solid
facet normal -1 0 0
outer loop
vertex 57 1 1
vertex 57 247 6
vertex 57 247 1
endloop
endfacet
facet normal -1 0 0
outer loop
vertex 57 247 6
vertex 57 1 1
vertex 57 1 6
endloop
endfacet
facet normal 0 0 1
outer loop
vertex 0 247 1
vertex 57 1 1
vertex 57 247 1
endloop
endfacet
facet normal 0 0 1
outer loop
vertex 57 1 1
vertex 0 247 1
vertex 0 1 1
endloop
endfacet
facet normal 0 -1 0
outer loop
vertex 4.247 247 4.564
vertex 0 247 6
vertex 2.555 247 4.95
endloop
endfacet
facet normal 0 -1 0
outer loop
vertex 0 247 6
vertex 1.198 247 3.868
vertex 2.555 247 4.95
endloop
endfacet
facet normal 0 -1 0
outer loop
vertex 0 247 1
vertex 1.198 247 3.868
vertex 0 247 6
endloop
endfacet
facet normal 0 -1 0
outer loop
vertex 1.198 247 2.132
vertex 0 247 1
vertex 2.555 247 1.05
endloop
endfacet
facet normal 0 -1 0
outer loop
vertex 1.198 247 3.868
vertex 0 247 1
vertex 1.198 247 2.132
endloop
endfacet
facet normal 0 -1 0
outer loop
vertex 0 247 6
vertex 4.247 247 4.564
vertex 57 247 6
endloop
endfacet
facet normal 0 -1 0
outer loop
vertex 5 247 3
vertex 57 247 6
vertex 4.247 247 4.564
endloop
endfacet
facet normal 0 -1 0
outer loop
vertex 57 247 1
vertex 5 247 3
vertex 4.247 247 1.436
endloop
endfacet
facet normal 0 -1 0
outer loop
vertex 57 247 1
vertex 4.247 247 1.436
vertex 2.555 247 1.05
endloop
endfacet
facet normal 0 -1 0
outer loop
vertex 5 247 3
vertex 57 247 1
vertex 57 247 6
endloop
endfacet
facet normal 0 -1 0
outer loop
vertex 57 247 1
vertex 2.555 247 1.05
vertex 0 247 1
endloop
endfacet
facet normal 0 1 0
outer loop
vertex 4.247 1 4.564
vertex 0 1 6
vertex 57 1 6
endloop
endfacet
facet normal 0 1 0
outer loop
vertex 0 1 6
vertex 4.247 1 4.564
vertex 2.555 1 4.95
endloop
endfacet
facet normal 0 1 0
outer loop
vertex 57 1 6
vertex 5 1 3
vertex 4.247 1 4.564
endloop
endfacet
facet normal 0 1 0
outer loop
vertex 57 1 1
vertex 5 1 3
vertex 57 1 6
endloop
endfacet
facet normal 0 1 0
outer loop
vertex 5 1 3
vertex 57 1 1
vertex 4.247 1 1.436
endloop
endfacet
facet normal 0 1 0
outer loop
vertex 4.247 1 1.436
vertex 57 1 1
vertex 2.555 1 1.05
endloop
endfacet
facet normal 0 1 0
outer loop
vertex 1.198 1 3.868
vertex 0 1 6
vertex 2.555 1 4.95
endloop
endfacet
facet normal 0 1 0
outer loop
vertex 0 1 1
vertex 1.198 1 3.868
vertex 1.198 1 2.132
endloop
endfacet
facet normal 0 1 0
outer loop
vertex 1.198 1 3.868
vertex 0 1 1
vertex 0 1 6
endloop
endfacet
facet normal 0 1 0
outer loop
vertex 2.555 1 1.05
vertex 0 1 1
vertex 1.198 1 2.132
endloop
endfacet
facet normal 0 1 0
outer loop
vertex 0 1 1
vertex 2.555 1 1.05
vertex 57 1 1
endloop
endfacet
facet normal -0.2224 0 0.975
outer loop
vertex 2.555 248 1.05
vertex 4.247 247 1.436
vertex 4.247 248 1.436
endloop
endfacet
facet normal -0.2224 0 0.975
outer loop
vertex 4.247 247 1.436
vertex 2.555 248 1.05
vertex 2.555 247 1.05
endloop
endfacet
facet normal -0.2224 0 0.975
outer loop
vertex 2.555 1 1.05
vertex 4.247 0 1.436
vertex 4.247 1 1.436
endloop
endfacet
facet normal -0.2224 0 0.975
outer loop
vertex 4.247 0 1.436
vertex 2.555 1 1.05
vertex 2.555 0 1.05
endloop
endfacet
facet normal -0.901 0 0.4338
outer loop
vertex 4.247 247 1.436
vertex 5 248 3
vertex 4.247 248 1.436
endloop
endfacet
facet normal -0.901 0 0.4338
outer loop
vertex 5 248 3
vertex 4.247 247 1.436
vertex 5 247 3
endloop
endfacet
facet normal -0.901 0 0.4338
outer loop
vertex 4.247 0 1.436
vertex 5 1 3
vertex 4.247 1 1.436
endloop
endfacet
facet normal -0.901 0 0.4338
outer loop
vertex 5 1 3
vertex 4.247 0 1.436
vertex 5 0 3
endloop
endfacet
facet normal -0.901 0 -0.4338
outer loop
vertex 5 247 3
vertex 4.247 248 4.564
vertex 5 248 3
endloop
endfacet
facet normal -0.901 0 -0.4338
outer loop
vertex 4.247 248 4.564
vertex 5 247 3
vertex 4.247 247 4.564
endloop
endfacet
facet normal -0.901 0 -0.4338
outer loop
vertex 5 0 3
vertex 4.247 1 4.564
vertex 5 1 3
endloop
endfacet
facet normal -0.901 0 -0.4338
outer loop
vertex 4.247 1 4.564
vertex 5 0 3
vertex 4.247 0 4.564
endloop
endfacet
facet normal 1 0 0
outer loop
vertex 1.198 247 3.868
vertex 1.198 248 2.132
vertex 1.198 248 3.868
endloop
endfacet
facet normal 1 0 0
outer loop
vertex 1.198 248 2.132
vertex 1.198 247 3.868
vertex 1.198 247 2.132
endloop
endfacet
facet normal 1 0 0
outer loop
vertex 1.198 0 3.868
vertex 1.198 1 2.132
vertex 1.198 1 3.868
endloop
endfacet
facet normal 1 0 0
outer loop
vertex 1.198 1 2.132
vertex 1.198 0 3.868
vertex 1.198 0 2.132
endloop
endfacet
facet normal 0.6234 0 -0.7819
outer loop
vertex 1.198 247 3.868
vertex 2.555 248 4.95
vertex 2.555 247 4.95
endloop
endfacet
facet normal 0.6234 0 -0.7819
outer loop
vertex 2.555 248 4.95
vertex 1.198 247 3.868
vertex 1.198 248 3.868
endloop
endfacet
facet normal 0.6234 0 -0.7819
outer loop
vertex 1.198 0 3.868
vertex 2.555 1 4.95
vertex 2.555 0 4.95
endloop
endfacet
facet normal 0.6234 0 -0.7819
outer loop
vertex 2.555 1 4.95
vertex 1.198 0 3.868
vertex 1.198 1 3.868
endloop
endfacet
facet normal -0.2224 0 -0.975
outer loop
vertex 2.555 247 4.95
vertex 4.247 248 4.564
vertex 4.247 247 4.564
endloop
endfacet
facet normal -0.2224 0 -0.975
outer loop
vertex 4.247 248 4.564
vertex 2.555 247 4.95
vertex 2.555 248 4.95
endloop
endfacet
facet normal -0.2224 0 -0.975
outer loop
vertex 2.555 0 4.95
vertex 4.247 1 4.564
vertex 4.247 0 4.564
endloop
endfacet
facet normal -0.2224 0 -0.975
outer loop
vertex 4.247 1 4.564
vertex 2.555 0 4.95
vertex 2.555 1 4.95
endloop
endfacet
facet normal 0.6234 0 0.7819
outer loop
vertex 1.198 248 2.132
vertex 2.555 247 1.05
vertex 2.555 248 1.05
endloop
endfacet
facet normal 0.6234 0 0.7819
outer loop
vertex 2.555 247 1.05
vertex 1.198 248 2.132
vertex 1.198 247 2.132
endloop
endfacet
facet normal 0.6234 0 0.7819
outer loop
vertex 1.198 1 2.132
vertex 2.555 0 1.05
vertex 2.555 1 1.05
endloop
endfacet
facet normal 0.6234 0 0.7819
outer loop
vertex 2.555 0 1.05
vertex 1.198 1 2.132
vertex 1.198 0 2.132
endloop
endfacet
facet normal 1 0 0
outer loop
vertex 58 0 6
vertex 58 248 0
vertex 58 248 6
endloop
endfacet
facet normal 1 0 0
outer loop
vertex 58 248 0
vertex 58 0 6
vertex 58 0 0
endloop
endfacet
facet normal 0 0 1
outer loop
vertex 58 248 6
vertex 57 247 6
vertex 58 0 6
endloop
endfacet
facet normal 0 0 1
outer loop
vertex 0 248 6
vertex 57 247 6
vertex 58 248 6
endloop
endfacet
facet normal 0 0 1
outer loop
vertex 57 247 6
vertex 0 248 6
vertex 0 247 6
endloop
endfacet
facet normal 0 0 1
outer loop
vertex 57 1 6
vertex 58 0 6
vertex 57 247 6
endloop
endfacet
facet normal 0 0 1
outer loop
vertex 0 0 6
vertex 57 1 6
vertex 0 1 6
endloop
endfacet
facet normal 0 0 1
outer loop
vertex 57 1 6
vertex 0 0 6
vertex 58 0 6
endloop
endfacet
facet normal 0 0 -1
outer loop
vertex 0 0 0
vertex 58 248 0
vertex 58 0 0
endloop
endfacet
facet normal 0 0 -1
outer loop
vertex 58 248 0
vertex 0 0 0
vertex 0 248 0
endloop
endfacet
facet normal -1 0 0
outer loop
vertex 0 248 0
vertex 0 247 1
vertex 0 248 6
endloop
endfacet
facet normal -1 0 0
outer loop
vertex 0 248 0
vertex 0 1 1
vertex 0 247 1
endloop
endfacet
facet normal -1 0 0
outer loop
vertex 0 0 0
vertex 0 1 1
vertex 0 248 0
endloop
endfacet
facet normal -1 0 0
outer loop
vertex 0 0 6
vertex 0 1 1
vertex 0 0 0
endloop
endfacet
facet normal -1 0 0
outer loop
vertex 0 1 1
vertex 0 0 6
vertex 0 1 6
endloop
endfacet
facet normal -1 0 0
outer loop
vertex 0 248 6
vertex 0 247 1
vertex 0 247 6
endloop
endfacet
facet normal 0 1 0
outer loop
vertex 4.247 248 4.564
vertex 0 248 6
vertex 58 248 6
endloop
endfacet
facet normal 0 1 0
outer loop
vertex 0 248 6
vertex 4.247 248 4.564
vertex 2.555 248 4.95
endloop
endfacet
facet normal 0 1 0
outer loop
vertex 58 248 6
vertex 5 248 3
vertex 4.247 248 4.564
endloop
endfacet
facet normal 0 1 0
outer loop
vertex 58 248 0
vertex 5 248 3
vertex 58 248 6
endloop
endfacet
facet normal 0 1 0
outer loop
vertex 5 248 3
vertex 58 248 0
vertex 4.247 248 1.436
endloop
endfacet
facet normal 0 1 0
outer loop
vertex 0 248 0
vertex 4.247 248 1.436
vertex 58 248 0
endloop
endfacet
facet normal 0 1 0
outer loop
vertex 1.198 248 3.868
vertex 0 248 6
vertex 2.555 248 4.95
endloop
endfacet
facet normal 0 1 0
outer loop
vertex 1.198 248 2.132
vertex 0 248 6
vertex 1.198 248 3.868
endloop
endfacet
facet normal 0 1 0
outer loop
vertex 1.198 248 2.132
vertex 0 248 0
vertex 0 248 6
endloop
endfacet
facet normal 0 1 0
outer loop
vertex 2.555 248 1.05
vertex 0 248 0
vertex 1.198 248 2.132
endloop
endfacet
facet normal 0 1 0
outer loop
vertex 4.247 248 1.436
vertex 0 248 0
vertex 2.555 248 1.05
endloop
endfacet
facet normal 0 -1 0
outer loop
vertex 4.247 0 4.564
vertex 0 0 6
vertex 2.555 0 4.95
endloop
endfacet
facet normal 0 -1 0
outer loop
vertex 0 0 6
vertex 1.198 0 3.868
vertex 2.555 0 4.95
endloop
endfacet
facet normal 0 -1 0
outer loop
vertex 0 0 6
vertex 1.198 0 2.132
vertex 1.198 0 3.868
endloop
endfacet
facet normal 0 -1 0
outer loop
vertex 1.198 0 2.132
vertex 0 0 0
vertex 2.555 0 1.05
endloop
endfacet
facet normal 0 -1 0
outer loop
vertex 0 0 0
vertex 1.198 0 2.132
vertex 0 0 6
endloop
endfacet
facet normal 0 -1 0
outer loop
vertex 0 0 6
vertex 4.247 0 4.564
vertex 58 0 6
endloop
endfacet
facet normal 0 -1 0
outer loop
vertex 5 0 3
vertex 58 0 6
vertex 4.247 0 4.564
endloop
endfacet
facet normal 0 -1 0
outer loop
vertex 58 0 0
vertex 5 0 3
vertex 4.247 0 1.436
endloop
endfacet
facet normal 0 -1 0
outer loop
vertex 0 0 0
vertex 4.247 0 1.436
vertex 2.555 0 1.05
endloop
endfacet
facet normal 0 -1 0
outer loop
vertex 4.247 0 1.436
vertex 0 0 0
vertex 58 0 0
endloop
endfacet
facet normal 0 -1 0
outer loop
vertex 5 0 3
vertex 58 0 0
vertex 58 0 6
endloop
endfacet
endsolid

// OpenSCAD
// [FL_INDEX: keywords="openscad, 3d_parametric, Customizable_Pill_Box_Lid, csg_solid" | COT="Parametric OpenSCAD design from 3DCodeverse"]
// Title: Customizable Pill Box Lid

//Applies To Each "Individual" Container
Length_For_Each_Compartment = 20; //[1:50]

//Applies To Each "Individual" Container
Width_For_Each_Compartment = 35; //[1:50]

//Applies To Entire Model
Height_For_Entire_Model = 15; //[1:50]


//number of boxes

number_days = 7; // [1,2,3,4,5,6,7,8,9,10]
number_per_day = 3; // [1,2,3,4,5,6]

//letters

//One Letter Works Best
row_one = "B"; 

//One Letter Works Best
row_two = "L";

//One Letter Works Best
row_three = "D";

//One Letter Works Best
row_four = "4";

//One Letter Works Best
row_five = "5";

//One Letter Works Best
row_six = "6";

//nub parameter

nubs = 0; //[0:Yes,1:No,2]
//Click Yes If You Are Printing A Lid



//MODEL VARIABLES

//box
length_x = Length_For_Each_Compartment;
width_y = Width_For_Each_Compartment;
height_z = Height_For_Entire_Model;
o_x = length_x;
o_y = width_y;
o_z = height_z;
i_x = o_x-4;
i_y = o_y-4;
i_z = o_z;

//number of days
d = number_days-2;
e = number_days-1;

//number of times per day
n = number_per_day-2;
l = number_per_day-1;




//MODULE - subtraction

module inside(){
union()
{
translate([-1,1,1])cube([((length_x*number_per_day)-(2*l)+2),(width_y*number_days)+1,6]);

translate([3,-1,3])
{
rotate([270,0,0]){cylinder(400,2,2);
}
}
}
}

difference(){
translate([0,0,0])cube([((length_x*number_per_day)-(2*l)+2),(width_y*number_days)+3,6]);
inside();
}
